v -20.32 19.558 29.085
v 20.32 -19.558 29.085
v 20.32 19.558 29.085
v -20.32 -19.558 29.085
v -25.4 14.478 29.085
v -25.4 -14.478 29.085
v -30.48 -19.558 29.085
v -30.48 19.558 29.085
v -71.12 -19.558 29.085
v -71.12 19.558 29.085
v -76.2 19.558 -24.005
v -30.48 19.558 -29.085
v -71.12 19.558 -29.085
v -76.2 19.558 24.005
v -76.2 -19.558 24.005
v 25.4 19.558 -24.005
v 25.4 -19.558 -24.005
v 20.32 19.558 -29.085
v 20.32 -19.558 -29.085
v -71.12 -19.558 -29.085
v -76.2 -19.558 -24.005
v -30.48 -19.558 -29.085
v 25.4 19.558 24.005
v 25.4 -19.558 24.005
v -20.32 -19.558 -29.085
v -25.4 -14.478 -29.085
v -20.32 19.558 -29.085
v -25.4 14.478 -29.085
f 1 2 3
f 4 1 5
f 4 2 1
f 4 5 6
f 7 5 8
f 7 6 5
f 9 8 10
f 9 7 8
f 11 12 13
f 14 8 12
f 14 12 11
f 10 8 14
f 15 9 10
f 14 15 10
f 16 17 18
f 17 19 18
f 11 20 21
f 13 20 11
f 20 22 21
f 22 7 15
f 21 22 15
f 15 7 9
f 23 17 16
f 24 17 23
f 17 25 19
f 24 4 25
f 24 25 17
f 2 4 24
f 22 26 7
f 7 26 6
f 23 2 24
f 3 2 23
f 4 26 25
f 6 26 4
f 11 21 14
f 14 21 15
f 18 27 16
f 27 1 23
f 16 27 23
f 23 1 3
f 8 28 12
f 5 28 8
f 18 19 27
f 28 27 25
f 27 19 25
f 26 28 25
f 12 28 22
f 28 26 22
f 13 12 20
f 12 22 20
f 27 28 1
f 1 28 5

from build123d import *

# Parameters (mm, degrees)
F0_W     = 50.8
F0_H     = 58.169952
F1_DEPTH = 19.558
F2_SIZE  = 5.08
F3_SIZE  = 5.08


with BuildPart() as f1:
    # F0 (on Front) → F1 (new body)
    with BuildSketch(Plane.XZ):
        Rectangle(F0_W, F0_H)
    extrude(amount=F1_DEPTH)

    # F2
    f2_edges = [f1.edges().sort_by_distance(p)[0] for p in [
        (25.4, -9.779, 29.084976),
    ]]
    chamfer(f2_edges, length=F2_SIZE)

    # F3
    f3_edges = [f1.edges().sort_by_distance(p)[0] for p in [
        (25.4, -9.779, -29.084976),
        (-25.4, -19.558, 0),
    ]]
    chamfer(f3_edges, length=F3_SIZE)

    # F4: F1 across face


with BuildPart() as f1_1:
    add(f1.part)
    add(f1.part.mirror(Plane(origin=(-25.4, -7.239, 0), x_dir=(0, -1, 0), z_dir=(-1, 0, 0))))

    # F5: F1 across face


with BuildPart() as f1_2:
    add(f1_1.part)
    add(f1_1.part.mirror(Plane(origin=(-25.4, 0, 0), x_dir=(1, 0, 0), z_dir=(0, 1, 0))))


solid = f1_2.part
